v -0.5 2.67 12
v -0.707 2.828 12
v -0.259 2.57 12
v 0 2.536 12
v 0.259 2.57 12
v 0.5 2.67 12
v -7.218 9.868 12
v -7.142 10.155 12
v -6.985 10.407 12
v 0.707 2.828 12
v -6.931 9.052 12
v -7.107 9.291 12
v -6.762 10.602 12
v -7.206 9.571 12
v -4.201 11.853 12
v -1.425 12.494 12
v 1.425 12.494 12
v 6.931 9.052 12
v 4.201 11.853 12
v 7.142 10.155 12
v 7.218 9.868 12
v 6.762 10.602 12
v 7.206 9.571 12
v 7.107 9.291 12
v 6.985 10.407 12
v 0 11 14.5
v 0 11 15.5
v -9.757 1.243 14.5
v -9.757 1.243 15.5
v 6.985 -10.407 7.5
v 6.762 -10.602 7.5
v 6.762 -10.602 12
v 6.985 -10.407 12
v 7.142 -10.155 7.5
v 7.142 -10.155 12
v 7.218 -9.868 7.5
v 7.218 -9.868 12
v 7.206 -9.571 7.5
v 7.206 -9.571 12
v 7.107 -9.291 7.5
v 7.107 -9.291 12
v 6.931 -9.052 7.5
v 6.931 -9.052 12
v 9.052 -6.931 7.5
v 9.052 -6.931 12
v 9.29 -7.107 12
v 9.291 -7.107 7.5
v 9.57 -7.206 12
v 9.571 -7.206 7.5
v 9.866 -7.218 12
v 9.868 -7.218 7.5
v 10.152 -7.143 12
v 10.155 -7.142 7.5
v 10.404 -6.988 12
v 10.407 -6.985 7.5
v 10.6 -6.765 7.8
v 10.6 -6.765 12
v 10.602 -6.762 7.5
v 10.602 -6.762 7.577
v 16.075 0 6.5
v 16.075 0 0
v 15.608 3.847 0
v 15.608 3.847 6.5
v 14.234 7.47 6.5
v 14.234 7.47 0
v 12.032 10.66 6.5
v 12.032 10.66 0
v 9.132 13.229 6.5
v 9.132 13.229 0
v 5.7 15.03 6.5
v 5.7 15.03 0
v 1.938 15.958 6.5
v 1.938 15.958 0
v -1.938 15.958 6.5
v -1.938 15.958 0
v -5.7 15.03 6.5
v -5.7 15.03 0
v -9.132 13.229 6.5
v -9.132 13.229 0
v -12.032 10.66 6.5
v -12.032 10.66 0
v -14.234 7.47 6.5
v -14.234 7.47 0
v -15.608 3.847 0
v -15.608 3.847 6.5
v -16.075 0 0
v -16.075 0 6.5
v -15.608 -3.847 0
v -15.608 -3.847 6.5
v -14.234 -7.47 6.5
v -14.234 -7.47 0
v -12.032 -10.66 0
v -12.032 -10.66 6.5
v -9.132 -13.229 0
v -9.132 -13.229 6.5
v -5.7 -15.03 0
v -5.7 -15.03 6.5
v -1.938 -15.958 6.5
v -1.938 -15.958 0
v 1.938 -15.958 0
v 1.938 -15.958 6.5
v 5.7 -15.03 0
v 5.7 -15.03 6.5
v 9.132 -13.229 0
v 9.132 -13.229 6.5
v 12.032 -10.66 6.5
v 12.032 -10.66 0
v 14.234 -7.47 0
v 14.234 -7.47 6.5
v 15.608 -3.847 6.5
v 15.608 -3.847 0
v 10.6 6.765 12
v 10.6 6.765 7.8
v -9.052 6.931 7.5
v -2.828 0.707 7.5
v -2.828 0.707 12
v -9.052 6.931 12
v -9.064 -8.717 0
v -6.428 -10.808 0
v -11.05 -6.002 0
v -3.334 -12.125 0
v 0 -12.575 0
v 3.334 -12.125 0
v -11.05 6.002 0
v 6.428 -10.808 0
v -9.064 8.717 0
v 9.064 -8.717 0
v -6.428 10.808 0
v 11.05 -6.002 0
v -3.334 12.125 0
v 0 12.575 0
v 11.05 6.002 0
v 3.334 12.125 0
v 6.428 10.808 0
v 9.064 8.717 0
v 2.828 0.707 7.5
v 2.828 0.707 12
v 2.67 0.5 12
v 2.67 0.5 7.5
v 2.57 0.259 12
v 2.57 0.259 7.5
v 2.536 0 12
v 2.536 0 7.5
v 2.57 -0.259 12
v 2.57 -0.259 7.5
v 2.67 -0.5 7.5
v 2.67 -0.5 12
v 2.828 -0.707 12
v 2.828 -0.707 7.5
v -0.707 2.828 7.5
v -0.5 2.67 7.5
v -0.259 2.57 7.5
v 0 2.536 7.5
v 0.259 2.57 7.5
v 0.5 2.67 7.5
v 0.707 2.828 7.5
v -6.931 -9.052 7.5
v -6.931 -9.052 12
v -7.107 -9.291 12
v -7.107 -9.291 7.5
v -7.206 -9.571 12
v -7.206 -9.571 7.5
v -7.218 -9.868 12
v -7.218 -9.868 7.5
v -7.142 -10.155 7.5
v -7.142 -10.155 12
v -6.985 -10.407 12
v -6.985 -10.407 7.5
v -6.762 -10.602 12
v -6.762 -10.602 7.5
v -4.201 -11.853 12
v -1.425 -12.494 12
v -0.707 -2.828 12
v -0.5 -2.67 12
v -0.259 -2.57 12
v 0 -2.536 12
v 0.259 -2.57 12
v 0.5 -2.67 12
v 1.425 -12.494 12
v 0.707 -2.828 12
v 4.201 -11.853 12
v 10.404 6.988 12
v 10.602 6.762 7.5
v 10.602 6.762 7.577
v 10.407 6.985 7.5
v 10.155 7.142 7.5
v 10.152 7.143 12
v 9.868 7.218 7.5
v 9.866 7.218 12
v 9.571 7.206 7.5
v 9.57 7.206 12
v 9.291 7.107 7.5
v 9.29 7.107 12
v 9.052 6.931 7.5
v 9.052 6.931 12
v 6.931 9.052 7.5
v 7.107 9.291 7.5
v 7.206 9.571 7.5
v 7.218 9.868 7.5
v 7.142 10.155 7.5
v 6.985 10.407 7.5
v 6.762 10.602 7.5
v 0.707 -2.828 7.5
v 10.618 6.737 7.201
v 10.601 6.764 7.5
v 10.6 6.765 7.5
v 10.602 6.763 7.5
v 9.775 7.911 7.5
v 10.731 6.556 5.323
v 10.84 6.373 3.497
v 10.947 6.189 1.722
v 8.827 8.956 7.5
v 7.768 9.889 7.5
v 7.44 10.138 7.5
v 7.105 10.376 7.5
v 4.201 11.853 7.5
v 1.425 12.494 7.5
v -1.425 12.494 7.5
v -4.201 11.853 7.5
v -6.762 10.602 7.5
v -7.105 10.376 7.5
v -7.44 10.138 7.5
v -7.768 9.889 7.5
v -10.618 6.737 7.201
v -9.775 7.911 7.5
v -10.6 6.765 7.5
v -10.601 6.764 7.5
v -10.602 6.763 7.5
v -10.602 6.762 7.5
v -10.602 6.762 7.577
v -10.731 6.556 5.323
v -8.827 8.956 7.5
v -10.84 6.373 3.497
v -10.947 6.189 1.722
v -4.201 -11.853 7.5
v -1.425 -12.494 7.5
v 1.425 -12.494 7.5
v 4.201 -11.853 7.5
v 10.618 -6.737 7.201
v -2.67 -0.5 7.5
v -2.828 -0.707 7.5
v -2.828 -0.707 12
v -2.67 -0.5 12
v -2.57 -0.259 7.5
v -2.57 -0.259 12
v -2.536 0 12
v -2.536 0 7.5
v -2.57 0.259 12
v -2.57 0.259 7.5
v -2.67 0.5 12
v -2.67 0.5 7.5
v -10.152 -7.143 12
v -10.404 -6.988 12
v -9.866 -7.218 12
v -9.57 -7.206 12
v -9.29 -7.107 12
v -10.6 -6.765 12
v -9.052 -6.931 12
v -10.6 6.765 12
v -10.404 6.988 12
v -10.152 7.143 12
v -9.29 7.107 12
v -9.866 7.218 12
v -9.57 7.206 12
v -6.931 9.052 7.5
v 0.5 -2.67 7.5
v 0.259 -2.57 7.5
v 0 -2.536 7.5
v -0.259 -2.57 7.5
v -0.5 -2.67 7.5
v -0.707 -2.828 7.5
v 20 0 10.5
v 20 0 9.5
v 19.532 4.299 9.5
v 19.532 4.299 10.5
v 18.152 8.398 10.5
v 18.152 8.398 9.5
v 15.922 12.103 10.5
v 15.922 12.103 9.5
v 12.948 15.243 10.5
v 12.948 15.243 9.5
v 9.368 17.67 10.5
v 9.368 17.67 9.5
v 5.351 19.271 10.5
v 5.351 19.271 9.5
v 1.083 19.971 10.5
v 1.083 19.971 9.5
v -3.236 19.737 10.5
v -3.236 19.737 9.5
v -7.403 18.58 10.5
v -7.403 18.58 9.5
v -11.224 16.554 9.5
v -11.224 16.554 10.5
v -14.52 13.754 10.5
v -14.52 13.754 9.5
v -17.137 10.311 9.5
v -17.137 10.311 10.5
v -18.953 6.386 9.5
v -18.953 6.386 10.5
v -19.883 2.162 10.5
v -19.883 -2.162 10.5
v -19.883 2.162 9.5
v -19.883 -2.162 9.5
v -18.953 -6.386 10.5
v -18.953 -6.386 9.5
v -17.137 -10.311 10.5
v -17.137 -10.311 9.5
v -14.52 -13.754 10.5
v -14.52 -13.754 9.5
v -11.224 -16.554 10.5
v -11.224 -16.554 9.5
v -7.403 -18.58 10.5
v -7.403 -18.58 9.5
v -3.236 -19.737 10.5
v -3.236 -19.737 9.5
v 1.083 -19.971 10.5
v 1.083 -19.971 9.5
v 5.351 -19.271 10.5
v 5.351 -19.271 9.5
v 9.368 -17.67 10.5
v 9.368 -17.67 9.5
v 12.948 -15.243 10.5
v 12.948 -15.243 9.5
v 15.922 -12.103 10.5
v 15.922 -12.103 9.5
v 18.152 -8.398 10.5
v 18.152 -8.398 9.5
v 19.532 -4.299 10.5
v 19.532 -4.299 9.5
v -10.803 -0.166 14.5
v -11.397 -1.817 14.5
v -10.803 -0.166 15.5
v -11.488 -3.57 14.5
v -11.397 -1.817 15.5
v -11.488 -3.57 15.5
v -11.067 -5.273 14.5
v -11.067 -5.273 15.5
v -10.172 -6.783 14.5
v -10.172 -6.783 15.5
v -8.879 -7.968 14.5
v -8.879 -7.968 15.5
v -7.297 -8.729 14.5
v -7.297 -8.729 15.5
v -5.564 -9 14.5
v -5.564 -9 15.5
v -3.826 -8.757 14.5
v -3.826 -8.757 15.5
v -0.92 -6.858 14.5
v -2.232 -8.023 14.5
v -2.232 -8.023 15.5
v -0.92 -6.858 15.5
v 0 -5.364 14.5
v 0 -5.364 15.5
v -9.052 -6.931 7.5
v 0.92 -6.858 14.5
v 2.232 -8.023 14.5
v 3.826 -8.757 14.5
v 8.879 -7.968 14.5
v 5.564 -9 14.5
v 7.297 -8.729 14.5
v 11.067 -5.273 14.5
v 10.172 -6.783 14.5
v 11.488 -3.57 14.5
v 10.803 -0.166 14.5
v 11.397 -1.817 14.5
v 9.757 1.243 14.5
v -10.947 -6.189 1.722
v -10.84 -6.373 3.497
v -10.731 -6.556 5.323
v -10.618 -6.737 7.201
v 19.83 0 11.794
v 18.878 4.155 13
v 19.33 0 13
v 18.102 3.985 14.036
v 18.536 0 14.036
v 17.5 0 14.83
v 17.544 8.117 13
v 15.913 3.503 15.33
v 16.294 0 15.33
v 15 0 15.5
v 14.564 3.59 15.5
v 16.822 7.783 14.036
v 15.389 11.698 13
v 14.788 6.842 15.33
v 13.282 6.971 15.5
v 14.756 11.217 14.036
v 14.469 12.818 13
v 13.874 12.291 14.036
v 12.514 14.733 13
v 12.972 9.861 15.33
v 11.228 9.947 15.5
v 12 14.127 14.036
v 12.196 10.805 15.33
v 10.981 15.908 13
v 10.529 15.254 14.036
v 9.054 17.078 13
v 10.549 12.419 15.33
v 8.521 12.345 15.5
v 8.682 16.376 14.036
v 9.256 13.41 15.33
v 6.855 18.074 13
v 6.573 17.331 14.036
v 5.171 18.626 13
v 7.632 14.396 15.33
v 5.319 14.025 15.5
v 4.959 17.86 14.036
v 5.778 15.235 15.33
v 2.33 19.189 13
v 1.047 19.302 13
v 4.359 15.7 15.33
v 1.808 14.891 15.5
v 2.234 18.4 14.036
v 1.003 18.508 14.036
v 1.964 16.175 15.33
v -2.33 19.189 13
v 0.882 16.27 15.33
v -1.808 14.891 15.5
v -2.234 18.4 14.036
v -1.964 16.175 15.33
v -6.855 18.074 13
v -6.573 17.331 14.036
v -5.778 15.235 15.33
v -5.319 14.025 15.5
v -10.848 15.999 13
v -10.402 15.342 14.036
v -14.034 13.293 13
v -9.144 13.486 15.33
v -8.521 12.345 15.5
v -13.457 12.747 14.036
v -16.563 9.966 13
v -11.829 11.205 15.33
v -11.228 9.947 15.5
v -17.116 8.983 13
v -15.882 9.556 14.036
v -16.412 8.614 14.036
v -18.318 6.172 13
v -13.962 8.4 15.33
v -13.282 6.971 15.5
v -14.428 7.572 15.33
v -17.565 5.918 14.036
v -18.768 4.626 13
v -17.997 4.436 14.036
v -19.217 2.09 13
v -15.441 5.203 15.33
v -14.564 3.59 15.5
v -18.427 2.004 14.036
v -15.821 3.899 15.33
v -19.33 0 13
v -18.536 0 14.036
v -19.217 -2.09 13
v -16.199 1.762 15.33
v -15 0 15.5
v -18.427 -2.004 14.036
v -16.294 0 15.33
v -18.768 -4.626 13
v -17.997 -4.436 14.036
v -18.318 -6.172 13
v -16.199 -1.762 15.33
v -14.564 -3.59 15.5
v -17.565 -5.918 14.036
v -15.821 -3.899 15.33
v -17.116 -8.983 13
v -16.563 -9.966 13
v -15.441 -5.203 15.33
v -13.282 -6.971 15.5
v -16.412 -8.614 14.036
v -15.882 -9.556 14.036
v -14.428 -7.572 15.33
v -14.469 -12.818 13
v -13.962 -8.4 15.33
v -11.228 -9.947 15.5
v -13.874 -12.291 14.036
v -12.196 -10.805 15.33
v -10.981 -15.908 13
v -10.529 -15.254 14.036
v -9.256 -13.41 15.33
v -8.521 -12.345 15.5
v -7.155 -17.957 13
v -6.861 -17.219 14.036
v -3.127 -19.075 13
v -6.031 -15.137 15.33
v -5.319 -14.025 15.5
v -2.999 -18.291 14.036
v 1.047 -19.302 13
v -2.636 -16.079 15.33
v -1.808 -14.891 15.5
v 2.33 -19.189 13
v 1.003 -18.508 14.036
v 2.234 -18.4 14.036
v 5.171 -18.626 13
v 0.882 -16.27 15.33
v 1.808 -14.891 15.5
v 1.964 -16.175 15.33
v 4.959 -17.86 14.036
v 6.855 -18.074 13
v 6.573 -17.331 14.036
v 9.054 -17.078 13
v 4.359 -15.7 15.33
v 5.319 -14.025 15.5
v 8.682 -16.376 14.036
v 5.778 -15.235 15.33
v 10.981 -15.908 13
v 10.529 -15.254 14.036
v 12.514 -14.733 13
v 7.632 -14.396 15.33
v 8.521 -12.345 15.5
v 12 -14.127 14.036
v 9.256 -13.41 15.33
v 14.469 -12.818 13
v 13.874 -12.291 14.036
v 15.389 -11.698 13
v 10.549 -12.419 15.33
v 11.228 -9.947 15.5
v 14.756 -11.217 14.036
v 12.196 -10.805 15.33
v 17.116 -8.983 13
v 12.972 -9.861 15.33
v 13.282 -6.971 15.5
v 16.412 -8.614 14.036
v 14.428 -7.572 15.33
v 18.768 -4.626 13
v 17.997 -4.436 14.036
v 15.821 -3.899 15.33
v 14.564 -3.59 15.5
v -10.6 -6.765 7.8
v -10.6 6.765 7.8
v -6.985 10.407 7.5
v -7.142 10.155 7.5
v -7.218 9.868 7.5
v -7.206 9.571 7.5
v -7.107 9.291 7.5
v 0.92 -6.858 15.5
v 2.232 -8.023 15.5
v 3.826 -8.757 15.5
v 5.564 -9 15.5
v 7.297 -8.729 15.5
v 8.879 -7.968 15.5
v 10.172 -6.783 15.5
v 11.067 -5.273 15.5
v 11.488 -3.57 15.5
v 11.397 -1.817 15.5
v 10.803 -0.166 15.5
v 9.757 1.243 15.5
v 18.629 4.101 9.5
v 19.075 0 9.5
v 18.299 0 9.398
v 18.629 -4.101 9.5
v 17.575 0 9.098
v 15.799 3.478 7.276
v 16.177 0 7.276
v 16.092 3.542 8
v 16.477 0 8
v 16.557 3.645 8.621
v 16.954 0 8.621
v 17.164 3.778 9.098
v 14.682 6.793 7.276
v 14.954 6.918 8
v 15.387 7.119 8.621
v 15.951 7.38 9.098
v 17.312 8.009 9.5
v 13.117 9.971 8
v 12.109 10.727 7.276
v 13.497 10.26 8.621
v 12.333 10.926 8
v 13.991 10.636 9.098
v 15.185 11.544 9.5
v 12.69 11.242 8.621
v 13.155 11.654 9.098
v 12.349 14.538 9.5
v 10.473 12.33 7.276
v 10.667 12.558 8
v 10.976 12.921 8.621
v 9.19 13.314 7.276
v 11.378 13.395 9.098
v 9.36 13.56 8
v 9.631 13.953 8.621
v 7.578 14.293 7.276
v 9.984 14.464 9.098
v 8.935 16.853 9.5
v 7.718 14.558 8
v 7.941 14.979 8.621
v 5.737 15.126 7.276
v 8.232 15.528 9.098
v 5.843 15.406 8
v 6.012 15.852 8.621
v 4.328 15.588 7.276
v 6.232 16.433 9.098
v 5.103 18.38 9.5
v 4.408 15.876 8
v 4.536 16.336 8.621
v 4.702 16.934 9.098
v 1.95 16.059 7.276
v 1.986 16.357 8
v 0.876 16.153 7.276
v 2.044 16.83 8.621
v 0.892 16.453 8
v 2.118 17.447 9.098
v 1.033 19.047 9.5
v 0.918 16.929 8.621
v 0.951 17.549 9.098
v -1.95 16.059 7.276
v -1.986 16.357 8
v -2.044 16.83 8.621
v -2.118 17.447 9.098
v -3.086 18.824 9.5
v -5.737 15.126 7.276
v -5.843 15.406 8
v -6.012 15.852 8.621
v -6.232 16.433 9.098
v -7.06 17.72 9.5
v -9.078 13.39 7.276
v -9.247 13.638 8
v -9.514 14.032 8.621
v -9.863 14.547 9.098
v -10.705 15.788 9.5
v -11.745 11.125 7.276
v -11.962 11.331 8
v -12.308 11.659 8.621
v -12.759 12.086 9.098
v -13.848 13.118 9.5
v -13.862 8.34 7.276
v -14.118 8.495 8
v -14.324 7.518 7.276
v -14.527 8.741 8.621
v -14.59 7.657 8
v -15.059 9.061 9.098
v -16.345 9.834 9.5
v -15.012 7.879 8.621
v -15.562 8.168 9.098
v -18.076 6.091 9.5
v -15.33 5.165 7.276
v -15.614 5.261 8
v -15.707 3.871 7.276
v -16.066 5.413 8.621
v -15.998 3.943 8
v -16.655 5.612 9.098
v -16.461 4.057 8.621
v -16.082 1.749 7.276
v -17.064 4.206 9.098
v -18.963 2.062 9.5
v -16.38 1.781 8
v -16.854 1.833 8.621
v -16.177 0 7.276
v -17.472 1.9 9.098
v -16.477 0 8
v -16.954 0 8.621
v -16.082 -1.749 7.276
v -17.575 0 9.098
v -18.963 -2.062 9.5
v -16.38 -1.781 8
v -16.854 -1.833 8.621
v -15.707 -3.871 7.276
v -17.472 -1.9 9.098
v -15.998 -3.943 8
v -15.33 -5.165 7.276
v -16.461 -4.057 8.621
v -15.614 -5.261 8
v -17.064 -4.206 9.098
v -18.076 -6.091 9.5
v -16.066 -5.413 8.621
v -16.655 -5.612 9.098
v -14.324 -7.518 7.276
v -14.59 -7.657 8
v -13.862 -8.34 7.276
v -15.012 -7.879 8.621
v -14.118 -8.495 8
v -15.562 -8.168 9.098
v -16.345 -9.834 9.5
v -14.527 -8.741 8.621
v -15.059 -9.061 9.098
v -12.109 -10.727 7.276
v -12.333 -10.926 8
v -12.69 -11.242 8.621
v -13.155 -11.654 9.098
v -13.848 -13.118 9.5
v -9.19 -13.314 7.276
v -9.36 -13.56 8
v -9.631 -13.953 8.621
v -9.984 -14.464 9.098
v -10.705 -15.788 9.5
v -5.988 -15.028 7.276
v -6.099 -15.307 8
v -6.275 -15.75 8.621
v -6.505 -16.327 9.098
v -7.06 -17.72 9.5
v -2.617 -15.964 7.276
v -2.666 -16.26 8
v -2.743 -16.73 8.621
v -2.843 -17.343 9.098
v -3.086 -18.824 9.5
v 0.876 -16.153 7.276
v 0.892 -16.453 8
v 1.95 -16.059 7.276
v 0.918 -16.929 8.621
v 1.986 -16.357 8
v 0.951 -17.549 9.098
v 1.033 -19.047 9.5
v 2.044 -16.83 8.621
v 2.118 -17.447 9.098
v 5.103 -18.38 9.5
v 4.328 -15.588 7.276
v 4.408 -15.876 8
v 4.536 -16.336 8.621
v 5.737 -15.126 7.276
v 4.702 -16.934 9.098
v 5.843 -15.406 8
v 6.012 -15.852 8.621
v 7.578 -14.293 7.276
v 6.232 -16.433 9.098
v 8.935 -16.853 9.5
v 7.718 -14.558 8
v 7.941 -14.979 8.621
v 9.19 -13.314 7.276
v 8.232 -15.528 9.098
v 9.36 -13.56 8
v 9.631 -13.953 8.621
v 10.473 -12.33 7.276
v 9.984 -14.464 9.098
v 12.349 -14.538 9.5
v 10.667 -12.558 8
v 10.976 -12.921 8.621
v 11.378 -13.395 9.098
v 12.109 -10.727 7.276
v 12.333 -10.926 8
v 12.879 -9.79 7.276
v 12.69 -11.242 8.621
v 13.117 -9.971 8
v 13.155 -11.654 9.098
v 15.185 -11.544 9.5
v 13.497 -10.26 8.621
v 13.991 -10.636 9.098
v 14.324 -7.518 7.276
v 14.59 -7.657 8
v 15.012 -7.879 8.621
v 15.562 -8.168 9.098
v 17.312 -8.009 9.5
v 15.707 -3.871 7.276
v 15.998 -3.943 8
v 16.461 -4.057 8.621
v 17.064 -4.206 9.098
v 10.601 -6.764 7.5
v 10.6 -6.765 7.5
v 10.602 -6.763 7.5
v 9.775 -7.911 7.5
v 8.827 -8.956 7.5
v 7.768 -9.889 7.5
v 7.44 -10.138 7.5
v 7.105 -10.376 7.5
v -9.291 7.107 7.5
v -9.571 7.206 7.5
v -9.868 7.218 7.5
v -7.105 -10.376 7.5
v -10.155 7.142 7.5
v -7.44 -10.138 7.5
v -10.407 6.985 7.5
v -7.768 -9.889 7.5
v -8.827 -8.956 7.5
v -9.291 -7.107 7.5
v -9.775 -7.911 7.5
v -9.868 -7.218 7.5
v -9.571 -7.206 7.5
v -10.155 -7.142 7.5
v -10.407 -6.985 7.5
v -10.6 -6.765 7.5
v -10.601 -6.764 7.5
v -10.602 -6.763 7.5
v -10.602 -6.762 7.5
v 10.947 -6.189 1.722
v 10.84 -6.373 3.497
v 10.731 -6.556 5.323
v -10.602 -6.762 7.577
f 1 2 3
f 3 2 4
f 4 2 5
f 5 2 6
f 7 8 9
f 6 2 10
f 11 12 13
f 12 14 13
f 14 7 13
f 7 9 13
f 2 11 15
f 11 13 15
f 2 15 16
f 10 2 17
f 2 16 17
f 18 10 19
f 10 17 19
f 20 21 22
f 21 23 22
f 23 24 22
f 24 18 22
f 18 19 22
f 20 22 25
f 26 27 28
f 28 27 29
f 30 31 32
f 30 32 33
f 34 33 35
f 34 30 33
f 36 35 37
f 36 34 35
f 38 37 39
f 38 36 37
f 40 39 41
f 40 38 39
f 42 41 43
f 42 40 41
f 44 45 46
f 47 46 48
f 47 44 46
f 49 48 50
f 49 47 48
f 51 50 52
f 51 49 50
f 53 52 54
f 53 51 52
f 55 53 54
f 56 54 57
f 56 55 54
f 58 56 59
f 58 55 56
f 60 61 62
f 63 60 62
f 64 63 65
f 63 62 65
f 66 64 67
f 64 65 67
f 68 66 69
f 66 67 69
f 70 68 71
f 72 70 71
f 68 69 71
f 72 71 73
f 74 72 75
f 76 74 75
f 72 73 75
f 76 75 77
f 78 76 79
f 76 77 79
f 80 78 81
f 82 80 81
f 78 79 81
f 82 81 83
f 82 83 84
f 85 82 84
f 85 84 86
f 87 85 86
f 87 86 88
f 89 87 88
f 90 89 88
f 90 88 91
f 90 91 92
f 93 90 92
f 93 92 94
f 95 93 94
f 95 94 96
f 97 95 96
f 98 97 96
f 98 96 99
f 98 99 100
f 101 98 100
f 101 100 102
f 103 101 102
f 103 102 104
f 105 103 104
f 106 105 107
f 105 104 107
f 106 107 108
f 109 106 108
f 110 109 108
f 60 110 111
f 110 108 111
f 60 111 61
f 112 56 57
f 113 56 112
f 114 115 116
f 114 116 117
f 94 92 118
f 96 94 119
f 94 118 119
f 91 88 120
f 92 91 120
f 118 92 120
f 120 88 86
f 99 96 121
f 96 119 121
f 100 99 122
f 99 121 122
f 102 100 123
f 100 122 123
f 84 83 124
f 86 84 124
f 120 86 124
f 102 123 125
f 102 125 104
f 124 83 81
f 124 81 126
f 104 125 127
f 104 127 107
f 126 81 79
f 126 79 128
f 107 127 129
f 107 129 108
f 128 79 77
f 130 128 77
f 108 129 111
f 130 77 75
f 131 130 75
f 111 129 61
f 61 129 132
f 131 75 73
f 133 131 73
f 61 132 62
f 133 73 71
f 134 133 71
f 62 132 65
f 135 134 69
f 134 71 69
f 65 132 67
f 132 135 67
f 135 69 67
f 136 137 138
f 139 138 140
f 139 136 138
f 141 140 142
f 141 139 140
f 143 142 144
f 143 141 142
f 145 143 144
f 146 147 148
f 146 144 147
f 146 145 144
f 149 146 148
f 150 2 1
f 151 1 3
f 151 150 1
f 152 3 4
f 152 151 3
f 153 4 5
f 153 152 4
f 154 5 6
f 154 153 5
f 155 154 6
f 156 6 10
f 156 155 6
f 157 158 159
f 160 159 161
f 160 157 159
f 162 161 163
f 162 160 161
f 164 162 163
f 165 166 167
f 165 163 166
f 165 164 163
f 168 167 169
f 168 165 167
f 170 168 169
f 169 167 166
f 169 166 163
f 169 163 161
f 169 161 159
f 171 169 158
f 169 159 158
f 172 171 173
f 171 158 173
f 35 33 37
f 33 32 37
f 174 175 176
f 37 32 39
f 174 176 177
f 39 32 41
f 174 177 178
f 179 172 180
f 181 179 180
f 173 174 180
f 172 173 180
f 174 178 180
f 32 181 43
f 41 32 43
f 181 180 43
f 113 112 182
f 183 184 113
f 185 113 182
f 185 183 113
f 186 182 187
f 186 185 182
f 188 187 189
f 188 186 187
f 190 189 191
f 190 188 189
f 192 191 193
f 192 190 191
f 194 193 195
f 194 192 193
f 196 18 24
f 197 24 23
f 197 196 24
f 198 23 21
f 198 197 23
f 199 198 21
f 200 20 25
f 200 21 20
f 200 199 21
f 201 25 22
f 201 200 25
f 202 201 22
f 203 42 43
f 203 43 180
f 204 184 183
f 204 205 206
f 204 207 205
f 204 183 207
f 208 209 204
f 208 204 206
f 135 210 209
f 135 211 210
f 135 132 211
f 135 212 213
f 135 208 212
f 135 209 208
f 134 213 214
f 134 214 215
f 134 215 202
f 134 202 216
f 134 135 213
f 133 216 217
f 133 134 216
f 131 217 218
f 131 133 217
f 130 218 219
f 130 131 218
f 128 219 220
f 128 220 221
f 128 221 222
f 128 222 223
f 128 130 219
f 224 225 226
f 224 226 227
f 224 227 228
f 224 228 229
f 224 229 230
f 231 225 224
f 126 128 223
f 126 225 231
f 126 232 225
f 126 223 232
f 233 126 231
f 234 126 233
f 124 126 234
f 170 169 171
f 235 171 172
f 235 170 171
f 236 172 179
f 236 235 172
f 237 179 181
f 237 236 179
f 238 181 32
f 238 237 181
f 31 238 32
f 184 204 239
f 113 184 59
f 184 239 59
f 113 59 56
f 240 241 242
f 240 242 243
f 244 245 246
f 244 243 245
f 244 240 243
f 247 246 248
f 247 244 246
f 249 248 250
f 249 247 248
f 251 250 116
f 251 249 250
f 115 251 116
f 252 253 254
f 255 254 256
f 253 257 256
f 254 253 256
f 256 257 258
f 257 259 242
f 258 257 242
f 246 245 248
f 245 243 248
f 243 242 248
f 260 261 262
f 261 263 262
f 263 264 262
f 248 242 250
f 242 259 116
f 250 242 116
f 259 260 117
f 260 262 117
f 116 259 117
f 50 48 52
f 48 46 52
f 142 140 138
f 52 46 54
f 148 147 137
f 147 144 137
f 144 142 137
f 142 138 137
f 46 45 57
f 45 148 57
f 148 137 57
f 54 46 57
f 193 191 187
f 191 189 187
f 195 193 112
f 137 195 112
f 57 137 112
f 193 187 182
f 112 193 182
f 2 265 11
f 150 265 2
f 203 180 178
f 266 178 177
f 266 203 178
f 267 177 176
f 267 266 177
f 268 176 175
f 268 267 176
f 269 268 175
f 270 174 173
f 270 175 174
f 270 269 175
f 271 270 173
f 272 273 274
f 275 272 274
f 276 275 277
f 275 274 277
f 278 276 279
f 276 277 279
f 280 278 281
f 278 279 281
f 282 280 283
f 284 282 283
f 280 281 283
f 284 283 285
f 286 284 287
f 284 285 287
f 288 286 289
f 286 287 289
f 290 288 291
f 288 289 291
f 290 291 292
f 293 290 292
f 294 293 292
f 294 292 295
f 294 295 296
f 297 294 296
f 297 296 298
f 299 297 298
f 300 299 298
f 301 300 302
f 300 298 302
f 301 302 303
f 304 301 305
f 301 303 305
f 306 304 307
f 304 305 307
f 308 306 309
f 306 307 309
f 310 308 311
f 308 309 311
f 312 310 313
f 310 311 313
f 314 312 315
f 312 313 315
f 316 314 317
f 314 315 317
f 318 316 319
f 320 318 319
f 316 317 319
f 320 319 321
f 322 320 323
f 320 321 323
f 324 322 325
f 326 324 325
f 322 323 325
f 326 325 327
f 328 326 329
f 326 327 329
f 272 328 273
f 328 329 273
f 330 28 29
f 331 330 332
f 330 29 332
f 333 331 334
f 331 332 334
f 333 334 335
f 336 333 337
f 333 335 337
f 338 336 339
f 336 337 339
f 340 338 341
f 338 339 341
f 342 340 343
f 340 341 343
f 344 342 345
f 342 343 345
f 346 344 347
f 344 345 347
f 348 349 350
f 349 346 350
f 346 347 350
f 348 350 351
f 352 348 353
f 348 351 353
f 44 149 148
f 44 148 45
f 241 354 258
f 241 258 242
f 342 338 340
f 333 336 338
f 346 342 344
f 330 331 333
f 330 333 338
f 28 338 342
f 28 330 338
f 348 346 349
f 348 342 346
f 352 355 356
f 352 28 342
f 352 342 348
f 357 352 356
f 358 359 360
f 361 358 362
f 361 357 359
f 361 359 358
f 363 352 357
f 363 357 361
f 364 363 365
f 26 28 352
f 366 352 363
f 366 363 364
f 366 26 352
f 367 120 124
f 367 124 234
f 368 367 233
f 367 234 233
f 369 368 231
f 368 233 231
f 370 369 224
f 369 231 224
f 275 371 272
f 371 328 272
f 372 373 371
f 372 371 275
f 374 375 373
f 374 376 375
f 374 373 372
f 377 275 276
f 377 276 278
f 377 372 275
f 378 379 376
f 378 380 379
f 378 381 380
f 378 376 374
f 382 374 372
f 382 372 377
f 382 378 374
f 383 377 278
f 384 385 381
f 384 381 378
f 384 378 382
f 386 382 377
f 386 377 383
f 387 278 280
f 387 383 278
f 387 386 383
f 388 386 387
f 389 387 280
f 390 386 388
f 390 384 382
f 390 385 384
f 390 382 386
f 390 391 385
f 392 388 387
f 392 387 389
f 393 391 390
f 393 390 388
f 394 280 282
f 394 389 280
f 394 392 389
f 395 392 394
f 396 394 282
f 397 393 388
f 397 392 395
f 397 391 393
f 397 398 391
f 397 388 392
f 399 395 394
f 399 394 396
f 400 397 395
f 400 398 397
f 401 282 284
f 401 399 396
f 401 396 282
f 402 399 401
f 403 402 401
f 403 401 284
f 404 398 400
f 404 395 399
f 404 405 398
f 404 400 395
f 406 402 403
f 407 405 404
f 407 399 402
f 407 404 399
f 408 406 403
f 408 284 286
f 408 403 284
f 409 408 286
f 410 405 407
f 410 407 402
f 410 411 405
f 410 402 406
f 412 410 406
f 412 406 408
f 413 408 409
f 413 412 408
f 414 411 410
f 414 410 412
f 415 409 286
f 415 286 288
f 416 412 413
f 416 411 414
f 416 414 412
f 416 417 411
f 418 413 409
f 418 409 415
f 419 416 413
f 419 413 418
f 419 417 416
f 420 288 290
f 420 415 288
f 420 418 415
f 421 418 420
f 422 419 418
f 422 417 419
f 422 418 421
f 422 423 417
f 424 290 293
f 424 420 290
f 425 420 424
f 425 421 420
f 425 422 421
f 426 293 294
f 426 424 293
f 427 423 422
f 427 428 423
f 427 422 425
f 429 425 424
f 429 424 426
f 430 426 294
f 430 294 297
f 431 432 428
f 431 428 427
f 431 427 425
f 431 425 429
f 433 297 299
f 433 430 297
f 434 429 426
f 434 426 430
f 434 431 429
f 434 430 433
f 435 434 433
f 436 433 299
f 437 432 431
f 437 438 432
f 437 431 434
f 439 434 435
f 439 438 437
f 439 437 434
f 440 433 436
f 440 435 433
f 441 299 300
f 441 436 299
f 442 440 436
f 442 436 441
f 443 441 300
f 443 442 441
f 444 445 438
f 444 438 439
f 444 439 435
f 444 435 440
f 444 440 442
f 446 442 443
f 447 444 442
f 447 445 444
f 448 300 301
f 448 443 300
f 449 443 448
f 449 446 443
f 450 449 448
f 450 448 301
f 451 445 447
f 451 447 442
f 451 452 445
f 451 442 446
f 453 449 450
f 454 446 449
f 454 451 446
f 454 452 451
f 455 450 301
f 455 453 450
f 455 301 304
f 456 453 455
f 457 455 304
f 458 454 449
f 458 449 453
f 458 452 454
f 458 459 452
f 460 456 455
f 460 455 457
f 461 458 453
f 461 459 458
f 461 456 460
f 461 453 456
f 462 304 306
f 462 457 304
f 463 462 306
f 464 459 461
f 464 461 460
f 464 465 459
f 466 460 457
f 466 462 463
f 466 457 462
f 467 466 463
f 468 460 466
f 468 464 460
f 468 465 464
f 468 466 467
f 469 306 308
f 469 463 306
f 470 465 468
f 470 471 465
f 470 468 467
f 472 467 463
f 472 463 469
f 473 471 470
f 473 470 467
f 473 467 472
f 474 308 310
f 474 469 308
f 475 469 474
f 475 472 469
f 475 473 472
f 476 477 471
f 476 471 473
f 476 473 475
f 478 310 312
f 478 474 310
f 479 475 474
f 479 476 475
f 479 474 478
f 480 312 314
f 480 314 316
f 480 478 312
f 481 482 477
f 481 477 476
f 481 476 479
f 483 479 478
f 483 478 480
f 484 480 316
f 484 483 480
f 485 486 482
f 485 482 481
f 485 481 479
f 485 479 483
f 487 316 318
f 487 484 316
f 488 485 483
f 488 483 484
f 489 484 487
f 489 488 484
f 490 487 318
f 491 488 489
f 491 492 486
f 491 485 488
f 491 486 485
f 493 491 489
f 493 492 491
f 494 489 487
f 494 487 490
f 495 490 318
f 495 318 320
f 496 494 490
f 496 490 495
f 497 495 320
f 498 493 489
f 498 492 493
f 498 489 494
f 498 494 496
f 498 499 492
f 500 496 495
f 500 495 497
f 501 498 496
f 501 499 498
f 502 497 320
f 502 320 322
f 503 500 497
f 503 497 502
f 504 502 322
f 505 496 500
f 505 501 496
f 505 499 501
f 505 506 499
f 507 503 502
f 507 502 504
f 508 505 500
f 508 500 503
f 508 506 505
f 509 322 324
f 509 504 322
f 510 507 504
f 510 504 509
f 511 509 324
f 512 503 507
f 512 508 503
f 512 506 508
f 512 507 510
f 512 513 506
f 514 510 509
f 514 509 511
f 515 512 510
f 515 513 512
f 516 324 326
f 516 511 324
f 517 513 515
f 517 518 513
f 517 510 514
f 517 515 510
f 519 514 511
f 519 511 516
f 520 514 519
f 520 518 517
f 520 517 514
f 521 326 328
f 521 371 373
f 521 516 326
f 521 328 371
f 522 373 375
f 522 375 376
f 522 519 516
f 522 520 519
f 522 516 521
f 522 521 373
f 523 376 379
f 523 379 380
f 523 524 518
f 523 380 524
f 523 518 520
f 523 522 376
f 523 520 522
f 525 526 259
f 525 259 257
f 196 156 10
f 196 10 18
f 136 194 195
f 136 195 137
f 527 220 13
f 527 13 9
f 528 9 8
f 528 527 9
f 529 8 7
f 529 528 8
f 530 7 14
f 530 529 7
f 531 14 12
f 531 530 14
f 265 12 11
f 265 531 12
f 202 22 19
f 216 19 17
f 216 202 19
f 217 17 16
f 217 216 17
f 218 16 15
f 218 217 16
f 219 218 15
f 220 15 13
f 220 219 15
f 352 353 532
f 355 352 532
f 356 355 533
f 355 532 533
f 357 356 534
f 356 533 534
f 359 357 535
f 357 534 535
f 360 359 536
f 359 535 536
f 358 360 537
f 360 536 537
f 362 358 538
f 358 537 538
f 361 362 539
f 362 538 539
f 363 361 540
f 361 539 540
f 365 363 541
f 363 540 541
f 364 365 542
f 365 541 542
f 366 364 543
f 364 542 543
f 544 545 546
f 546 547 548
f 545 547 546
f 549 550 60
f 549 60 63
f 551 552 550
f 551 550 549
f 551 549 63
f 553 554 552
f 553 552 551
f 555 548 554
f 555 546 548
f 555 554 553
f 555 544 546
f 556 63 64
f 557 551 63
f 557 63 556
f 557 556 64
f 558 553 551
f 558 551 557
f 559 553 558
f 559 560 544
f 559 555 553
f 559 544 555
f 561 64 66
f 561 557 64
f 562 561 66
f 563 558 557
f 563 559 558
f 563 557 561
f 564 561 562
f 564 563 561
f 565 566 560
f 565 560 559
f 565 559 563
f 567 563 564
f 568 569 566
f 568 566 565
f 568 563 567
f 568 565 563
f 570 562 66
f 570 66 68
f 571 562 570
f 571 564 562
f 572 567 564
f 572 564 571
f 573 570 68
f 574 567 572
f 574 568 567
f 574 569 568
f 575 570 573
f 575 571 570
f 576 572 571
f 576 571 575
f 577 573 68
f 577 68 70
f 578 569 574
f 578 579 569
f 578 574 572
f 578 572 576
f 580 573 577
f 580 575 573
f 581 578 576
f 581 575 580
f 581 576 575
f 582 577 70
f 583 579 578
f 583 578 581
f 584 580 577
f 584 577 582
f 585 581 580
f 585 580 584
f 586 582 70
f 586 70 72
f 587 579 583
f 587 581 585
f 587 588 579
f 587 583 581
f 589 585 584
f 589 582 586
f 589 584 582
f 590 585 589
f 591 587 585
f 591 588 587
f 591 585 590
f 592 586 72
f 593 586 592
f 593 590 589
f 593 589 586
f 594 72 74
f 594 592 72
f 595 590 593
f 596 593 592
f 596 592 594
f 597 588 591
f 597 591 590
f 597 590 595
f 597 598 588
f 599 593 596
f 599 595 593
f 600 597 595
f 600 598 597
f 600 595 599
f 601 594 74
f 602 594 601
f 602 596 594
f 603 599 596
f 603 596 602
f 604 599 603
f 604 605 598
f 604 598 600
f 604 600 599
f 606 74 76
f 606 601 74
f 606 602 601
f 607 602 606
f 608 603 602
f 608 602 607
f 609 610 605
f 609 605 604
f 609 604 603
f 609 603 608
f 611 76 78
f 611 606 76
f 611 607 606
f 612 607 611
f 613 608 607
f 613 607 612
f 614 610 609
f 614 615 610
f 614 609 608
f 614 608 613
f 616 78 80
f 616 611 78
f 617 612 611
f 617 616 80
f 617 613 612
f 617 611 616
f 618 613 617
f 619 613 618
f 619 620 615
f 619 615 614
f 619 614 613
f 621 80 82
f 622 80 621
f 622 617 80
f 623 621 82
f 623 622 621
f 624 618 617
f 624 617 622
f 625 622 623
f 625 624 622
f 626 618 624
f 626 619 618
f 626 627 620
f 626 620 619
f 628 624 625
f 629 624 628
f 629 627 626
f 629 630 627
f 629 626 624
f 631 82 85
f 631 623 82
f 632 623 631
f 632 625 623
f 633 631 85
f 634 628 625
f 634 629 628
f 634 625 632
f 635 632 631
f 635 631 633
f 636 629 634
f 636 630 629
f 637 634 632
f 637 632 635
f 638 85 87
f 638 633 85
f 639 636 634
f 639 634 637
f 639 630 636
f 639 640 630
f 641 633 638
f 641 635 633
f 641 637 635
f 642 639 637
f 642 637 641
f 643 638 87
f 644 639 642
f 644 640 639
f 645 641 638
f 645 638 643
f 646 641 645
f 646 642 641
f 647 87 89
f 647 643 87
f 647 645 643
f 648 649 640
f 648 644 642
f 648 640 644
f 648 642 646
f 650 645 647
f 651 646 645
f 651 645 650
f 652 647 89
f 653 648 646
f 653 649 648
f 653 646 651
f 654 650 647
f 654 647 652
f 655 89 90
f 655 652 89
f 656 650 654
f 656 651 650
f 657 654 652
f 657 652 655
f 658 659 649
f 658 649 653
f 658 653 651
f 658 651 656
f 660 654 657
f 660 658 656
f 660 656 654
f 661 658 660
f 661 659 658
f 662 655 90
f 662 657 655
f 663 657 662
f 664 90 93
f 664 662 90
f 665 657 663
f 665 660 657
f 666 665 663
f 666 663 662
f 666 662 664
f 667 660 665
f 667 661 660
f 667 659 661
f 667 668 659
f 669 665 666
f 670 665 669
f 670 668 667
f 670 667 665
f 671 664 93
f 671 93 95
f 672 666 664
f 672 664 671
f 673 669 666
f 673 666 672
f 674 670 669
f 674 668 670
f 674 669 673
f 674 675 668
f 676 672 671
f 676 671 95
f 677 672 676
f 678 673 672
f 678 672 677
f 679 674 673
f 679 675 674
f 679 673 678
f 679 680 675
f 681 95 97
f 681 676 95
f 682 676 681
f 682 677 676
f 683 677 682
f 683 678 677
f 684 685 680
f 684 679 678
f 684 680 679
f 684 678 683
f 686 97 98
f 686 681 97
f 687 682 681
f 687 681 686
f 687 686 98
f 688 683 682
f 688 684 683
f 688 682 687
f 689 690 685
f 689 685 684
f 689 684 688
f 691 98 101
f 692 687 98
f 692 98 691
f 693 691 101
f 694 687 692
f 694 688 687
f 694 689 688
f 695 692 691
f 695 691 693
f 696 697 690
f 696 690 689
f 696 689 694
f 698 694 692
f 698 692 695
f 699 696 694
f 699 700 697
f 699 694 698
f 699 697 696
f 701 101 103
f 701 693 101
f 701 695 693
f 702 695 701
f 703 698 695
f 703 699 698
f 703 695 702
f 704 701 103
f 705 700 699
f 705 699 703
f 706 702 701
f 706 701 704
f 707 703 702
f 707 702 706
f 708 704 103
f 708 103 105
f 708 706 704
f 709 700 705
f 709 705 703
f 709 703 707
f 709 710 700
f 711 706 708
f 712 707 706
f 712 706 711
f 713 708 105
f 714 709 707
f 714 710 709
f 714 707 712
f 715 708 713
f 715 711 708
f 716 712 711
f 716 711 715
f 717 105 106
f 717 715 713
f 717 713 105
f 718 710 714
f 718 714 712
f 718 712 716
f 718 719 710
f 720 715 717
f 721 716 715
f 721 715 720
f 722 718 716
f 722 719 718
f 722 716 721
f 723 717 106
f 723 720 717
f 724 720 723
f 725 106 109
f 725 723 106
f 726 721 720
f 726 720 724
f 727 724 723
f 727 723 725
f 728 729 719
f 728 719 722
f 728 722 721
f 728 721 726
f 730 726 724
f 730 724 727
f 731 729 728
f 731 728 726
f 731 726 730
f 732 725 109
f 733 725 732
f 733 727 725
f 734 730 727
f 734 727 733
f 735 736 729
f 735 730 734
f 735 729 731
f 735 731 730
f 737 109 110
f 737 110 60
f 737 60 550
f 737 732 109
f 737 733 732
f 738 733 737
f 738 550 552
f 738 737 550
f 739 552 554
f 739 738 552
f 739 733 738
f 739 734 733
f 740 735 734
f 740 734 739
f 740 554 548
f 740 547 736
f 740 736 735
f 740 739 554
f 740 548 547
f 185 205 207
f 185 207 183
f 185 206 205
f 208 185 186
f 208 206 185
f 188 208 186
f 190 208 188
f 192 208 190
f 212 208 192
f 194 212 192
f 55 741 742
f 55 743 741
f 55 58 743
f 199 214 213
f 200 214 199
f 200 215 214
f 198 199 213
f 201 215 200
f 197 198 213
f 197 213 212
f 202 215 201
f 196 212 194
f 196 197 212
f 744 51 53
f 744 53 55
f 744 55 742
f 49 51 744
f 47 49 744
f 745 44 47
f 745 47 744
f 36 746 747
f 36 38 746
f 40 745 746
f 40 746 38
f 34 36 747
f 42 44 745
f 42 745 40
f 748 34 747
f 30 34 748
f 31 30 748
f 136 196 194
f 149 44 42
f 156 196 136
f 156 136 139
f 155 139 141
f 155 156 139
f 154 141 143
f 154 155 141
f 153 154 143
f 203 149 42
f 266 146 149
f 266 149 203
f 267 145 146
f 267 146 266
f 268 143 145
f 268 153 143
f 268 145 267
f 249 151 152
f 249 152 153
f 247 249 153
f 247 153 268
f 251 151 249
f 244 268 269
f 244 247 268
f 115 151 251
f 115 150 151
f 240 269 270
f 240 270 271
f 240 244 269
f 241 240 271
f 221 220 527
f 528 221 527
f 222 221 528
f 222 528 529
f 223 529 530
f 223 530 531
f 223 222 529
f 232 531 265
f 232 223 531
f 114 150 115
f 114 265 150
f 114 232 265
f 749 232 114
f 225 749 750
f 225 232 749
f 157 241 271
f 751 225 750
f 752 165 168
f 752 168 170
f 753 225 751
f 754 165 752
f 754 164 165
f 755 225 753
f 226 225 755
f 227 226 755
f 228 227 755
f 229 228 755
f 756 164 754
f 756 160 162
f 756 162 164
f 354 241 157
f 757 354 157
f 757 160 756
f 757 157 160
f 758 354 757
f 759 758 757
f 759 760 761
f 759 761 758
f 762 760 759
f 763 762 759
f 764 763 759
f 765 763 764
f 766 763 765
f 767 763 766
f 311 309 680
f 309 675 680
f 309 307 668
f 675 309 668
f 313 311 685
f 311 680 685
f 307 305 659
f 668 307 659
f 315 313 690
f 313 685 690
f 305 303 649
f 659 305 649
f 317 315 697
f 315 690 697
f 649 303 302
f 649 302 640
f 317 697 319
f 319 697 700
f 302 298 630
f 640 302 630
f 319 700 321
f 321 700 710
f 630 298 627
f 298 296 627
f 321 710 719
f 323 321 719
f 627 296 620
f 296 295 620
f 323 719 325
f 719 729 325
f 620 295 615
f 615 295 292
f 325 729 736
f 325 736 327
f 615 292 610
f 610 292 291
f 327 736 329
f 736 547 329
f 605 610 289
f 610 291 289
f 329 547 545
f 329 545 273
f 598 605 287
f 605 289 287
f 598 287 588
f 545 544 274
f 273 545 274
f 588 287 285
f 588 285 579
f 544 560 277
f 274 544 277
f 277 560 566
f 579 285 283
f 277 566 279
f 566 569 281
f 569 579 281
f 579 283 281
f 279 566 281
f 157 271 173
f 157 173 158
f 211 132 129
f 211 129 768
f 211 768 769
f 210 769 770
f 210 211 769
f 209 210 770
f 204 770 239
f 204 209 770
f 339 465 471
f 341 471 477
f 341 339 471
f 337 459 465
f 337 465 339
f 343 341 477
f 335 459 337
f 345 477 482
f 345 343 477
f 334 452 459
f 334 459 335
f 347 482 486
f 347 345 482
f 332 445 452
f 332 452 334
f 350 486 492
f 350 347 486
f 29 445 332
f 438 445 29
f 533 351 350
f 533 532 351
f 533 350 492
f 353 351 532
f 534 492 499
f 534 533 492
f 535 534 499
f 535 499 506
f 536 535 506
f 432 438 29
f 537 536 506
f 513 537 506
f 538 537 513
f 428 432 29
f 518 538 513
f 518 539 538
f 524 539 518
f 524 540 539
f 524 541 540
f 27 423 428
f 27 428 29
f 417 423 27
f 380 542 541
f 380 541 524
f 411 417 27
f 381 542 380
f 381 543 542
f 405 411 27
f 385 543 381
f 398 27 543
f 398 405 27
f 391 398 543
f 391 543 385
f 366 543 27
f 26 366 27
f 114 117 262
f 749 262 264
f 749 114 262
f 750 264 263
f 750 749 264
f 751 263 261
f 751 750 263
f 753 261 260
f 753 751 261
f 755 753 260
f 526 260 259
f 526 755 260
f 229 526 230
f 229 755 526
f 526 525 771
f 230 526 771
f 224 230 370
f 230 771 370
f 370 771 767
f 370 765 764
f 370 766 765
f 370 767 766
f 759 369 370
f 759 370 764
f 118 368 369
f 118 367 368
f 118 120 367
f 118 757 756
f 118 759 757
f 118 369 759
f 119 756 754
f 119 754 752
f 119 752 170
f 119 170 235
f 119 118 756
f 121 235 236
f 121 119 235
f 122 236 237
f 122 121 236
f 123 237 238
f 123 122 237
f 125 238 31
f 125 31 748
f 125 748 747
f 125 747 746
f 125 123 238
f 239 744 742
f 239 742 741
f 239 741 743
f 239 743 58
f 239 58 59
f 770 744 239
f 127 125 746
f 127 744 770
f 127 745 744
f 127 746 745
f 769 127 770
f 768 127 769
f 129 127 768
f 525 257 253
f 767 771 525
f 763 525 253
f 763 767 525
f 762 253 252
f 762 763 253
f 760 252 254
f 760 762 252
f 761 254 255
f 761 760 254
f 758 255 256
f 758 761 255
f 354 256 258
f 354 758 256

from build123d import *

# Parameters (mm, degrees)
SKETCH_1_R          = 16.075
SKETCH_1_R_2        = 12.575
EXTRUDE_1_DEPTH     = 7.5
SKETCH_2_R          = 16.075
EXTRUDE_2_DEPTH     = 2
SKETCH_3_R          = 20
EXTRUDE_3_DEPTH     = 6
FILLET_1_R          = 5
CUT_EXTRUDE_1_DEPTH = 1
EXTRUDE_4_DEPTH     = 7
CUT_EXTRUDE_2_DEPTH = 4.5
FILLET_2_R          = 3
FILLET_3_R          = 10
FILLET_4_R          = 1


with BuildPart() as part:
    # 草图1 → 凸台-拉伸1 (new body)
    with BuildSketch(Plane.XY):
        Circle(SKETCH_1_R)
        Circle(SKETCH_1_R_2, mode=Mode.SUBTRACT)
    extrude(amount=EXTRUDE_1_DEPTH)

    # 草图2 → 凸台-拉伸2 (add)
    with BuildSketch(Plane.XY.offset(7.5)):
        Circle(SKETCH_2_R)
    extrude(amount=EXTRUDE_2_DEPTH)

    # 草图3 → 凸台-拉伸3 (add)
    with BuildSketch(Plane.XY.offset(9.5)):
        Circle(SKETCH_3_R)
    extrude(amount=EXTRUDE_3_DEPTH)

    # 圆角1
    fillet_1_edges = [part.edges().sort_by_distance(p)[0] for p in [
        (-20, 0, 15.5),
    ]]
    fillet(fillet_1_edges, radius=FILLET_1_R)

    # 草图4 → 切除-拉伸1 (cut)
    with BuildSketch(Plane.XY.offset(15.5)):
        with BuildLine():
            Line((9.757359313, 1.242640687), (0, 11))
            Line((0, 11), (-9.757359313, 1.242640687))
            ThreePointArc((-9.757359313, 1.242640687), (-8.878650761, -7.968295542), (0, -5.363869387))
            ThreePointArc((0, -5.363869387), (8.878650761, -7.968295542), (9.757359313, 1.242640687))
        make_face()
    extrude(amount=-CUT_EXTRUDE_1_DEPTH, mode=Mode.SUBTRACT)

    # 草图6 → 凸台-拉伸4 (add, symmetric)
    with BuildSketch(Plane(origin=(0, 0, 0), x_dir=(1, 0, 0), z_dir=(0, 1, 0))):
        Polygon((10.75, -5), (11.05, 0), (14, 0), (14, -7.5), (10.6, -7.5), align=None)
    extrude_4 = extrude(amount=EXTRUDE_4_DEPTH, both=True)

    # 镜向1: 凸台-拉伸4 across plane
    add(extrude_4.mirror(Plane(origin=(0, 0, 0), x_dir=(0, 0, 1), z_dir=(1, 0, 0))))

    # 草图5 → 切除-拉伸2 (cut)
    with BuildSketch(Plane(origin=(0, 0, 7.5), x_dir=(-1, 0, 0), z_dir=(0, 0, -1))):
        with BuildLine():
            Line((7.767720909, 9.889041252), (0, 2.121320344))
            Line((0, 2.121320344), (-7.767720909, 9.889041252))
            ThreePointArc((-7.767720909, 9.889041252), (0, 12.575), (7.767720909, 9.889041252))
        make_face()
        with BuildLine():
            Line((-7.767720909, -9.889041252), (0, -2.121320344))
            Line((0, -2.121320344), (7.767720909, -9.889041252))
            ThreePointArc((7.767720909, -9.889041252), (0, -12.575), (-7.767720909, -9.889041252))
        make_face()
        with BuildLine():
            Line((-9.889041252, 7.767720909), (-2.121320344, 0))
            Line((-2.121320344, 0), (-9.889041252, -7.767720909))
            ThreePointArc((-9.889041252, -7.767720909), (-10.256771671, -7.275249816), (-10.6, -6.765399101))
            Line((-10.6, -6.765399101), (-10.6, 6.765399101))
            ThreePointArc((-10.6, 6.765399101), (-10.256771671, 7.275249816), (-9.889041252, 7.767720909))
        make_face()
        with BuildLine():
            Line((2.121320344, 0), (9.889041252, 7.767720909))
            ThreePointArc((9.889041252, 7.767720909), (10.256771671, 7.275249816), (10.6, 6.765399101))
            Line((10.6, 6.765399101), (10.6, -6.765399101))
            ThreePointArc((10.6, -6.765399101), (10.256771671, -7.275249816), (9.889041252, -7.767720909))
            Line((9.889041252, -7.767720909), (2.121320344, 0))
        make_face()
    extrude(amount=-CUT_EXTRUDE_2_DEPTH, mode=Mode.SUBTRACT)

    # 圆角2
    fillet_2_edges = [part.edges().sort_by_distance(p)[0] for p in [
        (-16.075, 0, 9.5),
    ]]
    fillet(fillet_2_edges, radius=FILLET_2_R)

    # 圆角3
    # the kernel refuses this fillet: 10 mm, written as the material it takes off along each edge
    with BuildSketch(Plane(origin=(10.6, -7.514725314, 7.5), x_dir=(0.05989229072795002, 0, -0.9982048454657784), z_dir=(0, 1, 0))) as fillet_3_piece_1_section:
        with BuildLine():
            CenterArc((FILLET_3_R * 0.0299730484909, -FILLET_3_R), FILLET_3_R, 90, 3.433630362)
            Line((-FILLET_3_R * 0.029919242237, -FILLET_3_R * 0.00179515453422), (0, 0))
            Line((0, 0), (FILLET_3_R * 0.0299730484909, 0))
        make_face()
    fillet_3_piece_1 = extrude(amount=15.029450627, mode=Mode.PRIVATE)
    fillet_3_piece_1 = fillet_3_piece_1 & Plane(origin=(0, 0, 7.497328359), x_dir=(1, 0, 0), z_dir=(0, 0, -1)) * Cylinder(12.575, 32, mode=Mode.PRIVATE)
    add(fillet_3_piece_1, mode=Mode.SUBTRACT)
    with BuildSketch(Plane(origin=(-10.6, -7.514725314, 7.5), x_dir=(-0.05989229072795002, 0, -0.9982048454657784), z_dir=(0, 1, 0))) as fillet_3_piece_2_section:
        with BuildLine():
            CenterArc((FILLET_3_R * 0.0299730484909, FILLET_3_R), FILLET_3_R, 266.566369638, 3.433630362)
            Line((-FILLET_3_R * 0.029919242237, FILLET_3_R * 0.00179515453422), (0, 0))
            Line((0, 0), (FILLET_3_R * 0.0299730484909, 0))
        make_face()
    fillet_3_piece_2 = extrude(amount=15.029450627, mode=Mode.PRIVATE)
    fillet_3_piece_2 = fillet_3_piece_2 & Plane(origin=(0, 0, 7.497328359), x_dir=(1, 0, 0), z_dir=(0, 0, -1)) * Cylinder(12.575, 32, mode=Mode.PRIVATE)
    add(fillet_3_piece_2, mode=Mode.SUBTRACT)

    # 圆角4
    # the kernel refuses this fillet: 1 mm, written as the material it adds along each edge
    with BuildSketch(Plane(origin=(0, -2.121320344, 7.5), x_dir=(0.7071067811865518, -0.7071067811865432, 0), z_dir=(0, 0, 1)), Plane(origin=(2.121320344, 0, 7.5), x_dir=(0.7071067811865438, 0.7071067811865512, 0), z_dir=(0, 0, 1))) as fillet_4_piece_1:
        with BuildLine():
            CenterArc((FILLET_4_R, -FILLET_4_R), FILLET_4_R, 90, 90)
            Line((0, -FILLET_4_R), (0, 0))
            Line((0, 0), (FILLET_4_R, 0))
        make_face()
    extrude(amount=7)
    with BuildSketch(Plane(origin=(-7.767720909, -9.889041252, 7.5), x_dir=(0.8157540941110909, -0.5783988744292242, 0), z_dir=(0, 0, 1)), Plane(origin=(-9.889041252, 7.767720909, 7.5), x_dir=(-0.5783988744292212, -0.8157540941110929, 0), z_dir=(0, 0, 1)), Plane(origin=(7.767720909, 9.889041252, 7.5), x_dir=(-0.8157540941110928, 0.5783988744292216, 0), z_dir=(0, 0, 1))) as fillet_4_piece_2:
        with BuildLine():
            CenterArc((1.184434693, 0.998796574), FILLET_4_R, 170.338006618, 102.473187785)
            Line((0.198619674, 1.166632059), (0, 0))
            ThreePointArc((0, 0), (0.616739804, -0.015133081), (1.233479607, 0))
        make_face()
    extrude(amount=7.583699018)
    with BuildSketch(Plane(origin=(-9.889041252, -7.767720909, 7.5), x_dir=(-0.578398874429234, 0.8157540941110841, 0), z_dir=(0, 0, 1))) as fillet_4_piece_3_section:
        with BuildLine():
            CenterArc((1.184434693, -0.998796574), FILLET_4_R, 87.188805597, 102.473187785)
            Line((0.198619674, -1.166632059), (0, 0))
            ThreePointArc((0, 0), (0.616739804, 0.015133081), (1.233479607, 0))
        make_face()
    fillet_4_piece_3 = extrude(amount=7.583699018, mode=Mode.PRIVATE)
    fillet_4_piece_3 = split(fillet_4_piece_3, bisect_by=Plane(origin=(-10.600515055, -6.764586018, 14.5), z_dir=(0, 0, -1)), keep=Keep.TOP, mode=Mode.PRIVATE)
    add(fillet_4_piece_3)
    with BuildSketch(Plane(origin=(-2.121320344, 0, 7.5), x_dir=(-0.7071067811865511, 0.7071067811865441, 0), z_dir=(0, 0, 1)), Plane(origin=(0, 2.121320344, 7.5), x_dir=(0.7071067811865439, 0.7071067811865512, 0), z_dir=(0, 0, 1))) as fillet_4_piece_4:
        with BuildLine():
            CenterArc((FILLET_4_R, FILLET_4_R), FILLET_4_R, 180, 90)
            Line((0, FILLET_4_R), (0, 0))
            Line((0, 0), (FILLET_4_R, 0))
        make_face()
    extrude(amount=7)
    with BuildSketch(Plane(origin=(-7.767720909, 9.889041252, 7.5), x_dir=(0.8157540941110883, 0.5783988744292278, 0), z_dir=(0, 0, 1)), Plane(origin=(9.889041252, 7.767720909, 7.5), x_dir=(0.5783988744292311, -0.8157540941110861, 0), z_dir=(0, 0, 1)), Plane(origin=(7.767720909, -9.889041252, 7.5), x_dir=(-0.8157540941110859, -0.5783988744292314, 0), z_dir=(0, 0, 1))) as fillet_4_piece_5:
        with BuildLine():
            CenterArc((1.184434693, -0.998796574), FILLET_4_R, 87.188805597, 102.473187785)
            Line((0.198619674, -1.166632059), (0, 0))
            ThreePointArc((0, 0), (0.616739804, 0.015133081), (1.233479607, 0))
        make_face()
    extrude(amount=7.583699018)
    with BuildSketch(Plane(origin=(9.889041252, -7.767720909, 7.5), x_dir=(0.5783988744292226, 0.8157540941110919, 0), z_dir=(0, 0, 1))) as fillet_4_piece_6_section:
        with BuildLine():
            CenterArc((1.184434693, 0.998796574), FILLET_4_R, 170.338006618, 102.473187785)
            Line((0.198619674, 1.166632059), (0, 0))
            ThreePointArc((0, 0), (0.616739804, -0.015133081), (1.233479607, 0))
        make_face()
    fillet_4_piece_6 = extrude(amount=7.583699018, mode=Mode.PRIVATE)
    fillet_4_piece_6 = split(fillet_4_piece_6, bisect_by=Plane(origin=(10.600515055, -6.764586018, 14.5), z_dir=(0, 0, -1)), keep=Keep.TOP, mode=Mode.PRIVATE)
    add(fillet_4_piece_6)


solid = part.part
